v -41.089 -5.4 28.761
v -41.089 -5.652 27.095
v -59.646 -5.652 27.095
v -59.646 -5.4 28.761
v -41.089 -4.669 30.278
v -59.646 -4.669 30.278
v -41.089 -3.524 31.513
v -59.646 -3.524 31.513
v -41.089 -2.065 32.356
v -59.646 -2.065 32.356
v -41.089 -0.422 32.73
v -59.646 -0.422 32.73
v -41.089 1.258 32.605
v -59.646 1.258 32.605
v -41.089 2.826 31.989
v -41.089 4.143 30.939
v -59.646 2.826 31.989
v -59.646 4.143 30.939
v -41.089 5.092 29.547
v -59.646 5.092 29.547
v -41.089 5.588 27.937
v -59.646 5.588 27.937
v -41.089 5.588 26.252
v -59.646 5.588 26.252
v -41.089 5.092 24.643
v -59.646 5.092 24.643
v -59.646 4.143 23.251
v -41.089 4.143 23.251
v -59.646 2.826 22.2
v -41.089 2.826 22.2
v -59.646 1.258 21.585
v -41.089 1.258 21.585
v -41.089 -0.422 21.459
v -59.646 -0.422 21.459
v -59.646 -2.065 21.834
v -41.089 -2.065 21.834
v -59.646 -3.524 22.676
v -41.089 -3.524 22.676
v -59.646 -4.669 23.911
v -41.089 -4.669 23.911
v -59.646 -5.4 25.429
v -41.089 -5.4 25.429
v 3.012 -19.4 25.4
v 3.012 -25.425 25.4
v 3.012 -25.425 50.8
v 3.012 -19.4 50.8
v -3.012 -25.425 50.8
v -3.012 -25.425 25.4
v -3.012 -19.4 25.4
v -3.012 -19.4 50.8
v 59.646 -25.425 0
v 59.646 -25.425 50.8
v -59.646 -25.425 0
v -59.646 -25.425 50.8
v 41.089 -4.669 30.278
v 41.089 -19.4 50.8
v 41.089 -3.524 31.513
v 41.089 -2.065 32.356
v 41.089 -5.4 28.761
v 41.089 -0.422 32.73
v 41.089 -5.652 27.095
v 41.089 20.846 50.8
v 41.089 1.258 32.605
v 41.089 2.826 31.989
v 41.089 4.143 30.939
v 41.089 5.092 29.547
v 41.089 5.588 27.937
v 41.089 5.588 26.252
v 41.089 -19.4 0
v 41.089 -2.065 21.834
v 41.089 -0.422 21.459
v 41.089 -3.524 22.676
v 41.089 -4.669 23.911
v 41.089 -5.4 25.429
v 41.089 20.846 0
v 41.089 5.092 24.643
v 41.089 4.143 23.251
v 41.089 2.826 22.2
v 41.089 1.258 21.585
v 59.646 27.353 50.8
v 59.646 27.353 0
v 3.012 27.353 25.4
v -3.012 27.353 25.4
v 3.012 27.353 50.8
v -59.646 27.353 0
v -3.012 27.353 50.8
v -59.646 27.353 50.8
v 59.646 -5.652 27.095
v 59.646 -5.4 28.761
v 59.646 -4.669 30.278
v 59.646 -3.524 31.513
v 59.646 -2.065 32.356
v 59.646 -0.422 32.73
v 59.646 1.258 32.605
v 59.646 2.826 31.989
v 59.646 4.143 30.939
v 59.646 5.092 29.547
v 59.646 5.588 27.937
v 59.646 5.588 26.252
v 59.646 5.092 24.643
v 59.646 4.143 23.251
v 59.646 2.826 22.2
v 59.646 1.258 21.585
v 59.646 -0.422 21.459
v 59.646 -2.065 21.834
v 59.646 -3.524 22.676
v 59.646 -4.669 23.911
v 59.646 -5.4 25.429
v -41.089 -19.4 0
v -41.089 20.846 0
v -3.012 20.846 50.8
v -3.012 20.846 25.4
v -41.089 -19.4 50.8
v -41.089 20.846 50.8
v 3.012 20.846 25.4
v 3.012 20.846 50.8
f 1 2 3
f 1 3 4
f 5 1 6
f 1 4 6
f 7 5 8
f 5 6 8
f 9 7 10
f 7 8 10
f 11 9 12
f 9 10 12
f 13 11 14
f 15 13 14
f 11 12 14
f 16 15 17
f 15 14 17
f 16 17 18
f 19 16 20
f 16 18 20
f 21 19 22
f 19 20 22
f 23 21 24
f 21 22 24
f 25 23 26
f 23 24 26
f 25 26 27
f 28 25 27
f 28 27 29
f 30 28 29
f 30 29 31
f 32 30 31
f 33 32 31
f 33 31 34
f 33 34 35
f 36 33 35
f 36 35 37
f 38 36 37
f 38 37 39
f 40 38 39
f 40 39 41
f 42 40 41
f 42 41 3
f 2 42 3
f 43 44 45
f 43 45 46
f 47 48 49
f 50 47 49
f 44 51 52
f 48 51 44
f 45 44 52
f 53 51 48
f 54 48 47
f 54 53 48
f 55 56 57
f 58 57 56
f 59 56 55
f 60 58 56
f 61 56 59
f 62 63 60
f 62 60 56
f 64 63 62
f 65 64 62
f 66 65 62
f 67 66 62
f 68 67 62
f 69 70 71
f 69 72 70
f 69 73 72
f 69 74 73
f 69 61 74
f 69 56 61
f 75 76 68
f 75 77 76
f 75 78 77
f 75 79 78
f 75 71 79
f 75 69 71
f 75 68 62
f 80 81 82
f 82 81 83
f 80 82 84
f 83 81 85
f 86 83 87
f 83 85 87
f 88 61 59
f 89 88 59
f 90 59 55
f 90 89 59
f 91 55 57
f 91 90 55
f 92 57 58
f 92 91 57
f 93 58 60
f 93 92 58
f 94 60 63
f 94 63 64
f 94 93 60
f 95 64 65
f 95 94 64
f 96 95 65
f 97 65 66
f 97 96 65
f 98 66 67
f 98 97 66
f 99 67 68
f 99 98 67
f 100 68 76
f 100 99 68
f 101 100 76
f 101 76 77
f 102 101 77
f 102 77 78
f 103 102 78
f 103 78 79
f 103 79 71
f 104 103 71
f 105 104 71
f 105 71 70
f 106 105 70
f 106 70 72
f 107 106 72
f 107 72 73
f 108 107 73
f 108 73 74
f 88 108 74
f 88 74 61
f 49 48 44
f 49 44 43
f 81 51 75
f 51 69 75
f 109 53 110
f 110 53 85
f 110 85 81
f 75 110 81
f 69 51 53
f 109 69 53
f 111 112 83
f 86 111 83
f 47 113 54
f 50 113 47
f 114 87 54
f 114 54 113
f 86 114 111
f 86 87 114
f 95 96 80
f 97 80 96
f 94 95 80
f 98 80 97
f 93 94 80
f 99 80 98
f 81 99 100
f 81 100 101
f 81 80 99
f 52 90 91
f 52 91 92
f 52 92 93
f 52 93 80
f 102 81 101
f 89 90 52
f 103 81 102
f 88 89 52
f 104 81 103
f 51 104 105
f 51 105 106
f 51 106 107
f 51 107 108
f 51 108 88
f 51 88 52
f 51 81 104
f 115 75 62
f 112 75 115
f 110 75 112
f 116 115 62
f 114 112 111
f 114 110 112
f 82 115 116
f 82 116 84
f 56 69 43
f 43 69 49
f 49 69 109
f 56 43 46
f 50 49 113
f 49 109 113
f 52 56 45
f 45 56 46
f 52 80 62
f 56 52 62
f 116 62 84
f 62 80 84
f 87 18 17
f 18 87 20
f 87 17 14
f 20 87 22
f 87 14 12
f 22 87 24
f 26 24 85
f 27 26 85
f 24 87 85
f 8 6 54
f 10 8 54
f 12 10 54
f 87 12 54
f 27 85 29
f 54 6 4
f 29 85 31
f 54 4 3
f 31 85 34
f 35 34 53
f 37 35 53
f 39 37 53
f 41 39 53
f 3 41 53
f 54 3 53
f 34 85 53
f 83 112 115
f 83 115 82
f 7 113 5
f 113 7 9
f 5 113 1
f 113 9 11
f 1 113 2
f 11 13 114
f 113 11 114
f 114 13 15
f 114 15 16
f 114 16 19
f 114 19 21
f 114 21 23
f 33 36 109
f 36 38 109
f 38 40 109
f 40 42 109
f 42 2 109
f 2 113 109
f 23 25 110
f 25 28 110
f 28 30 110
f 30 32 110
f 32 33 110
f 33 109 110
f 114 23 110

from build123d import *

# Parameters (mm, degrees)
F0_W     = 18.556535
F0_H     = 6.506839
F0_W_2   = 38.07705
F0_H_2   = 40.245993
F0_H_3   = 6.024849
F1_DEPTH = 50.8
F2_R     = 5.6515
F3_DEPTH = 170.688
F4_W     = 6.024849
F4_H     = 25.4
F5_DEPTH = 25.4
F6_W     = 6.506839
F6_H     = 25.4
F7_DEPTH = 25.4


with BuildPart() as f1:
    # F0 (on Top) → F1 (new body)
    with BuildSketch(Plane.XY):
        with Locations((-50.367742, 24.099397)):
            Rectangle(F0_W, F0_H)
        with Locations((-22.05095, 24.099397)):
            Rectangle(F0_W_2, F0_H)
        with Locations((-50.367742, 0.722981)):
            Rectangle(F0_W, F0_H_2)
        with Locations((-50.367742, -22.412439)):
            Rectangle(F0_W, F0_H_3)
        with Locations((-22.05095, -22.412439)):
            Rectangle(F0_W_2, F0_H_3)
    extrude(amount=F1_DEPTH)

    # F2 (on face) → F3 (cut)
    with BuildSketch(Plane(origin=(-59.64601, 0, 0), x_dir=(0, -1, 0), z_dir=(-1, 0, 0))):
        with Locations((0, 27.094796)):
            Circle(F2_R)
    extrude(amount=-F3_DEPTH, mode=Mode.SUBTRACT)

    # F4 (on face) → F5 (join)
    with BuildSketch(Plane.YZ.offset(-3.012425)):
        with Locations((-22.412439, 12.7)):
            Rectangle(F4_W, F4_H)
    extrude(amount=F5_DEPTH)

    # F6 (on face) → F7 (join)
    with BuildSketch(Plane.YZ.offset(-3.012425)):
        with Locations((24.099397, 12.7)):
            Rectangle(F6_W, F6_H)
    extrude(amount=F7_DEPTH)

    # F8: F1 across plane


with BuildPart() as f1_1:
    add(f1.part)
    add(f1.part.mirror(Plane.YZ))


solid = f1_1.part
